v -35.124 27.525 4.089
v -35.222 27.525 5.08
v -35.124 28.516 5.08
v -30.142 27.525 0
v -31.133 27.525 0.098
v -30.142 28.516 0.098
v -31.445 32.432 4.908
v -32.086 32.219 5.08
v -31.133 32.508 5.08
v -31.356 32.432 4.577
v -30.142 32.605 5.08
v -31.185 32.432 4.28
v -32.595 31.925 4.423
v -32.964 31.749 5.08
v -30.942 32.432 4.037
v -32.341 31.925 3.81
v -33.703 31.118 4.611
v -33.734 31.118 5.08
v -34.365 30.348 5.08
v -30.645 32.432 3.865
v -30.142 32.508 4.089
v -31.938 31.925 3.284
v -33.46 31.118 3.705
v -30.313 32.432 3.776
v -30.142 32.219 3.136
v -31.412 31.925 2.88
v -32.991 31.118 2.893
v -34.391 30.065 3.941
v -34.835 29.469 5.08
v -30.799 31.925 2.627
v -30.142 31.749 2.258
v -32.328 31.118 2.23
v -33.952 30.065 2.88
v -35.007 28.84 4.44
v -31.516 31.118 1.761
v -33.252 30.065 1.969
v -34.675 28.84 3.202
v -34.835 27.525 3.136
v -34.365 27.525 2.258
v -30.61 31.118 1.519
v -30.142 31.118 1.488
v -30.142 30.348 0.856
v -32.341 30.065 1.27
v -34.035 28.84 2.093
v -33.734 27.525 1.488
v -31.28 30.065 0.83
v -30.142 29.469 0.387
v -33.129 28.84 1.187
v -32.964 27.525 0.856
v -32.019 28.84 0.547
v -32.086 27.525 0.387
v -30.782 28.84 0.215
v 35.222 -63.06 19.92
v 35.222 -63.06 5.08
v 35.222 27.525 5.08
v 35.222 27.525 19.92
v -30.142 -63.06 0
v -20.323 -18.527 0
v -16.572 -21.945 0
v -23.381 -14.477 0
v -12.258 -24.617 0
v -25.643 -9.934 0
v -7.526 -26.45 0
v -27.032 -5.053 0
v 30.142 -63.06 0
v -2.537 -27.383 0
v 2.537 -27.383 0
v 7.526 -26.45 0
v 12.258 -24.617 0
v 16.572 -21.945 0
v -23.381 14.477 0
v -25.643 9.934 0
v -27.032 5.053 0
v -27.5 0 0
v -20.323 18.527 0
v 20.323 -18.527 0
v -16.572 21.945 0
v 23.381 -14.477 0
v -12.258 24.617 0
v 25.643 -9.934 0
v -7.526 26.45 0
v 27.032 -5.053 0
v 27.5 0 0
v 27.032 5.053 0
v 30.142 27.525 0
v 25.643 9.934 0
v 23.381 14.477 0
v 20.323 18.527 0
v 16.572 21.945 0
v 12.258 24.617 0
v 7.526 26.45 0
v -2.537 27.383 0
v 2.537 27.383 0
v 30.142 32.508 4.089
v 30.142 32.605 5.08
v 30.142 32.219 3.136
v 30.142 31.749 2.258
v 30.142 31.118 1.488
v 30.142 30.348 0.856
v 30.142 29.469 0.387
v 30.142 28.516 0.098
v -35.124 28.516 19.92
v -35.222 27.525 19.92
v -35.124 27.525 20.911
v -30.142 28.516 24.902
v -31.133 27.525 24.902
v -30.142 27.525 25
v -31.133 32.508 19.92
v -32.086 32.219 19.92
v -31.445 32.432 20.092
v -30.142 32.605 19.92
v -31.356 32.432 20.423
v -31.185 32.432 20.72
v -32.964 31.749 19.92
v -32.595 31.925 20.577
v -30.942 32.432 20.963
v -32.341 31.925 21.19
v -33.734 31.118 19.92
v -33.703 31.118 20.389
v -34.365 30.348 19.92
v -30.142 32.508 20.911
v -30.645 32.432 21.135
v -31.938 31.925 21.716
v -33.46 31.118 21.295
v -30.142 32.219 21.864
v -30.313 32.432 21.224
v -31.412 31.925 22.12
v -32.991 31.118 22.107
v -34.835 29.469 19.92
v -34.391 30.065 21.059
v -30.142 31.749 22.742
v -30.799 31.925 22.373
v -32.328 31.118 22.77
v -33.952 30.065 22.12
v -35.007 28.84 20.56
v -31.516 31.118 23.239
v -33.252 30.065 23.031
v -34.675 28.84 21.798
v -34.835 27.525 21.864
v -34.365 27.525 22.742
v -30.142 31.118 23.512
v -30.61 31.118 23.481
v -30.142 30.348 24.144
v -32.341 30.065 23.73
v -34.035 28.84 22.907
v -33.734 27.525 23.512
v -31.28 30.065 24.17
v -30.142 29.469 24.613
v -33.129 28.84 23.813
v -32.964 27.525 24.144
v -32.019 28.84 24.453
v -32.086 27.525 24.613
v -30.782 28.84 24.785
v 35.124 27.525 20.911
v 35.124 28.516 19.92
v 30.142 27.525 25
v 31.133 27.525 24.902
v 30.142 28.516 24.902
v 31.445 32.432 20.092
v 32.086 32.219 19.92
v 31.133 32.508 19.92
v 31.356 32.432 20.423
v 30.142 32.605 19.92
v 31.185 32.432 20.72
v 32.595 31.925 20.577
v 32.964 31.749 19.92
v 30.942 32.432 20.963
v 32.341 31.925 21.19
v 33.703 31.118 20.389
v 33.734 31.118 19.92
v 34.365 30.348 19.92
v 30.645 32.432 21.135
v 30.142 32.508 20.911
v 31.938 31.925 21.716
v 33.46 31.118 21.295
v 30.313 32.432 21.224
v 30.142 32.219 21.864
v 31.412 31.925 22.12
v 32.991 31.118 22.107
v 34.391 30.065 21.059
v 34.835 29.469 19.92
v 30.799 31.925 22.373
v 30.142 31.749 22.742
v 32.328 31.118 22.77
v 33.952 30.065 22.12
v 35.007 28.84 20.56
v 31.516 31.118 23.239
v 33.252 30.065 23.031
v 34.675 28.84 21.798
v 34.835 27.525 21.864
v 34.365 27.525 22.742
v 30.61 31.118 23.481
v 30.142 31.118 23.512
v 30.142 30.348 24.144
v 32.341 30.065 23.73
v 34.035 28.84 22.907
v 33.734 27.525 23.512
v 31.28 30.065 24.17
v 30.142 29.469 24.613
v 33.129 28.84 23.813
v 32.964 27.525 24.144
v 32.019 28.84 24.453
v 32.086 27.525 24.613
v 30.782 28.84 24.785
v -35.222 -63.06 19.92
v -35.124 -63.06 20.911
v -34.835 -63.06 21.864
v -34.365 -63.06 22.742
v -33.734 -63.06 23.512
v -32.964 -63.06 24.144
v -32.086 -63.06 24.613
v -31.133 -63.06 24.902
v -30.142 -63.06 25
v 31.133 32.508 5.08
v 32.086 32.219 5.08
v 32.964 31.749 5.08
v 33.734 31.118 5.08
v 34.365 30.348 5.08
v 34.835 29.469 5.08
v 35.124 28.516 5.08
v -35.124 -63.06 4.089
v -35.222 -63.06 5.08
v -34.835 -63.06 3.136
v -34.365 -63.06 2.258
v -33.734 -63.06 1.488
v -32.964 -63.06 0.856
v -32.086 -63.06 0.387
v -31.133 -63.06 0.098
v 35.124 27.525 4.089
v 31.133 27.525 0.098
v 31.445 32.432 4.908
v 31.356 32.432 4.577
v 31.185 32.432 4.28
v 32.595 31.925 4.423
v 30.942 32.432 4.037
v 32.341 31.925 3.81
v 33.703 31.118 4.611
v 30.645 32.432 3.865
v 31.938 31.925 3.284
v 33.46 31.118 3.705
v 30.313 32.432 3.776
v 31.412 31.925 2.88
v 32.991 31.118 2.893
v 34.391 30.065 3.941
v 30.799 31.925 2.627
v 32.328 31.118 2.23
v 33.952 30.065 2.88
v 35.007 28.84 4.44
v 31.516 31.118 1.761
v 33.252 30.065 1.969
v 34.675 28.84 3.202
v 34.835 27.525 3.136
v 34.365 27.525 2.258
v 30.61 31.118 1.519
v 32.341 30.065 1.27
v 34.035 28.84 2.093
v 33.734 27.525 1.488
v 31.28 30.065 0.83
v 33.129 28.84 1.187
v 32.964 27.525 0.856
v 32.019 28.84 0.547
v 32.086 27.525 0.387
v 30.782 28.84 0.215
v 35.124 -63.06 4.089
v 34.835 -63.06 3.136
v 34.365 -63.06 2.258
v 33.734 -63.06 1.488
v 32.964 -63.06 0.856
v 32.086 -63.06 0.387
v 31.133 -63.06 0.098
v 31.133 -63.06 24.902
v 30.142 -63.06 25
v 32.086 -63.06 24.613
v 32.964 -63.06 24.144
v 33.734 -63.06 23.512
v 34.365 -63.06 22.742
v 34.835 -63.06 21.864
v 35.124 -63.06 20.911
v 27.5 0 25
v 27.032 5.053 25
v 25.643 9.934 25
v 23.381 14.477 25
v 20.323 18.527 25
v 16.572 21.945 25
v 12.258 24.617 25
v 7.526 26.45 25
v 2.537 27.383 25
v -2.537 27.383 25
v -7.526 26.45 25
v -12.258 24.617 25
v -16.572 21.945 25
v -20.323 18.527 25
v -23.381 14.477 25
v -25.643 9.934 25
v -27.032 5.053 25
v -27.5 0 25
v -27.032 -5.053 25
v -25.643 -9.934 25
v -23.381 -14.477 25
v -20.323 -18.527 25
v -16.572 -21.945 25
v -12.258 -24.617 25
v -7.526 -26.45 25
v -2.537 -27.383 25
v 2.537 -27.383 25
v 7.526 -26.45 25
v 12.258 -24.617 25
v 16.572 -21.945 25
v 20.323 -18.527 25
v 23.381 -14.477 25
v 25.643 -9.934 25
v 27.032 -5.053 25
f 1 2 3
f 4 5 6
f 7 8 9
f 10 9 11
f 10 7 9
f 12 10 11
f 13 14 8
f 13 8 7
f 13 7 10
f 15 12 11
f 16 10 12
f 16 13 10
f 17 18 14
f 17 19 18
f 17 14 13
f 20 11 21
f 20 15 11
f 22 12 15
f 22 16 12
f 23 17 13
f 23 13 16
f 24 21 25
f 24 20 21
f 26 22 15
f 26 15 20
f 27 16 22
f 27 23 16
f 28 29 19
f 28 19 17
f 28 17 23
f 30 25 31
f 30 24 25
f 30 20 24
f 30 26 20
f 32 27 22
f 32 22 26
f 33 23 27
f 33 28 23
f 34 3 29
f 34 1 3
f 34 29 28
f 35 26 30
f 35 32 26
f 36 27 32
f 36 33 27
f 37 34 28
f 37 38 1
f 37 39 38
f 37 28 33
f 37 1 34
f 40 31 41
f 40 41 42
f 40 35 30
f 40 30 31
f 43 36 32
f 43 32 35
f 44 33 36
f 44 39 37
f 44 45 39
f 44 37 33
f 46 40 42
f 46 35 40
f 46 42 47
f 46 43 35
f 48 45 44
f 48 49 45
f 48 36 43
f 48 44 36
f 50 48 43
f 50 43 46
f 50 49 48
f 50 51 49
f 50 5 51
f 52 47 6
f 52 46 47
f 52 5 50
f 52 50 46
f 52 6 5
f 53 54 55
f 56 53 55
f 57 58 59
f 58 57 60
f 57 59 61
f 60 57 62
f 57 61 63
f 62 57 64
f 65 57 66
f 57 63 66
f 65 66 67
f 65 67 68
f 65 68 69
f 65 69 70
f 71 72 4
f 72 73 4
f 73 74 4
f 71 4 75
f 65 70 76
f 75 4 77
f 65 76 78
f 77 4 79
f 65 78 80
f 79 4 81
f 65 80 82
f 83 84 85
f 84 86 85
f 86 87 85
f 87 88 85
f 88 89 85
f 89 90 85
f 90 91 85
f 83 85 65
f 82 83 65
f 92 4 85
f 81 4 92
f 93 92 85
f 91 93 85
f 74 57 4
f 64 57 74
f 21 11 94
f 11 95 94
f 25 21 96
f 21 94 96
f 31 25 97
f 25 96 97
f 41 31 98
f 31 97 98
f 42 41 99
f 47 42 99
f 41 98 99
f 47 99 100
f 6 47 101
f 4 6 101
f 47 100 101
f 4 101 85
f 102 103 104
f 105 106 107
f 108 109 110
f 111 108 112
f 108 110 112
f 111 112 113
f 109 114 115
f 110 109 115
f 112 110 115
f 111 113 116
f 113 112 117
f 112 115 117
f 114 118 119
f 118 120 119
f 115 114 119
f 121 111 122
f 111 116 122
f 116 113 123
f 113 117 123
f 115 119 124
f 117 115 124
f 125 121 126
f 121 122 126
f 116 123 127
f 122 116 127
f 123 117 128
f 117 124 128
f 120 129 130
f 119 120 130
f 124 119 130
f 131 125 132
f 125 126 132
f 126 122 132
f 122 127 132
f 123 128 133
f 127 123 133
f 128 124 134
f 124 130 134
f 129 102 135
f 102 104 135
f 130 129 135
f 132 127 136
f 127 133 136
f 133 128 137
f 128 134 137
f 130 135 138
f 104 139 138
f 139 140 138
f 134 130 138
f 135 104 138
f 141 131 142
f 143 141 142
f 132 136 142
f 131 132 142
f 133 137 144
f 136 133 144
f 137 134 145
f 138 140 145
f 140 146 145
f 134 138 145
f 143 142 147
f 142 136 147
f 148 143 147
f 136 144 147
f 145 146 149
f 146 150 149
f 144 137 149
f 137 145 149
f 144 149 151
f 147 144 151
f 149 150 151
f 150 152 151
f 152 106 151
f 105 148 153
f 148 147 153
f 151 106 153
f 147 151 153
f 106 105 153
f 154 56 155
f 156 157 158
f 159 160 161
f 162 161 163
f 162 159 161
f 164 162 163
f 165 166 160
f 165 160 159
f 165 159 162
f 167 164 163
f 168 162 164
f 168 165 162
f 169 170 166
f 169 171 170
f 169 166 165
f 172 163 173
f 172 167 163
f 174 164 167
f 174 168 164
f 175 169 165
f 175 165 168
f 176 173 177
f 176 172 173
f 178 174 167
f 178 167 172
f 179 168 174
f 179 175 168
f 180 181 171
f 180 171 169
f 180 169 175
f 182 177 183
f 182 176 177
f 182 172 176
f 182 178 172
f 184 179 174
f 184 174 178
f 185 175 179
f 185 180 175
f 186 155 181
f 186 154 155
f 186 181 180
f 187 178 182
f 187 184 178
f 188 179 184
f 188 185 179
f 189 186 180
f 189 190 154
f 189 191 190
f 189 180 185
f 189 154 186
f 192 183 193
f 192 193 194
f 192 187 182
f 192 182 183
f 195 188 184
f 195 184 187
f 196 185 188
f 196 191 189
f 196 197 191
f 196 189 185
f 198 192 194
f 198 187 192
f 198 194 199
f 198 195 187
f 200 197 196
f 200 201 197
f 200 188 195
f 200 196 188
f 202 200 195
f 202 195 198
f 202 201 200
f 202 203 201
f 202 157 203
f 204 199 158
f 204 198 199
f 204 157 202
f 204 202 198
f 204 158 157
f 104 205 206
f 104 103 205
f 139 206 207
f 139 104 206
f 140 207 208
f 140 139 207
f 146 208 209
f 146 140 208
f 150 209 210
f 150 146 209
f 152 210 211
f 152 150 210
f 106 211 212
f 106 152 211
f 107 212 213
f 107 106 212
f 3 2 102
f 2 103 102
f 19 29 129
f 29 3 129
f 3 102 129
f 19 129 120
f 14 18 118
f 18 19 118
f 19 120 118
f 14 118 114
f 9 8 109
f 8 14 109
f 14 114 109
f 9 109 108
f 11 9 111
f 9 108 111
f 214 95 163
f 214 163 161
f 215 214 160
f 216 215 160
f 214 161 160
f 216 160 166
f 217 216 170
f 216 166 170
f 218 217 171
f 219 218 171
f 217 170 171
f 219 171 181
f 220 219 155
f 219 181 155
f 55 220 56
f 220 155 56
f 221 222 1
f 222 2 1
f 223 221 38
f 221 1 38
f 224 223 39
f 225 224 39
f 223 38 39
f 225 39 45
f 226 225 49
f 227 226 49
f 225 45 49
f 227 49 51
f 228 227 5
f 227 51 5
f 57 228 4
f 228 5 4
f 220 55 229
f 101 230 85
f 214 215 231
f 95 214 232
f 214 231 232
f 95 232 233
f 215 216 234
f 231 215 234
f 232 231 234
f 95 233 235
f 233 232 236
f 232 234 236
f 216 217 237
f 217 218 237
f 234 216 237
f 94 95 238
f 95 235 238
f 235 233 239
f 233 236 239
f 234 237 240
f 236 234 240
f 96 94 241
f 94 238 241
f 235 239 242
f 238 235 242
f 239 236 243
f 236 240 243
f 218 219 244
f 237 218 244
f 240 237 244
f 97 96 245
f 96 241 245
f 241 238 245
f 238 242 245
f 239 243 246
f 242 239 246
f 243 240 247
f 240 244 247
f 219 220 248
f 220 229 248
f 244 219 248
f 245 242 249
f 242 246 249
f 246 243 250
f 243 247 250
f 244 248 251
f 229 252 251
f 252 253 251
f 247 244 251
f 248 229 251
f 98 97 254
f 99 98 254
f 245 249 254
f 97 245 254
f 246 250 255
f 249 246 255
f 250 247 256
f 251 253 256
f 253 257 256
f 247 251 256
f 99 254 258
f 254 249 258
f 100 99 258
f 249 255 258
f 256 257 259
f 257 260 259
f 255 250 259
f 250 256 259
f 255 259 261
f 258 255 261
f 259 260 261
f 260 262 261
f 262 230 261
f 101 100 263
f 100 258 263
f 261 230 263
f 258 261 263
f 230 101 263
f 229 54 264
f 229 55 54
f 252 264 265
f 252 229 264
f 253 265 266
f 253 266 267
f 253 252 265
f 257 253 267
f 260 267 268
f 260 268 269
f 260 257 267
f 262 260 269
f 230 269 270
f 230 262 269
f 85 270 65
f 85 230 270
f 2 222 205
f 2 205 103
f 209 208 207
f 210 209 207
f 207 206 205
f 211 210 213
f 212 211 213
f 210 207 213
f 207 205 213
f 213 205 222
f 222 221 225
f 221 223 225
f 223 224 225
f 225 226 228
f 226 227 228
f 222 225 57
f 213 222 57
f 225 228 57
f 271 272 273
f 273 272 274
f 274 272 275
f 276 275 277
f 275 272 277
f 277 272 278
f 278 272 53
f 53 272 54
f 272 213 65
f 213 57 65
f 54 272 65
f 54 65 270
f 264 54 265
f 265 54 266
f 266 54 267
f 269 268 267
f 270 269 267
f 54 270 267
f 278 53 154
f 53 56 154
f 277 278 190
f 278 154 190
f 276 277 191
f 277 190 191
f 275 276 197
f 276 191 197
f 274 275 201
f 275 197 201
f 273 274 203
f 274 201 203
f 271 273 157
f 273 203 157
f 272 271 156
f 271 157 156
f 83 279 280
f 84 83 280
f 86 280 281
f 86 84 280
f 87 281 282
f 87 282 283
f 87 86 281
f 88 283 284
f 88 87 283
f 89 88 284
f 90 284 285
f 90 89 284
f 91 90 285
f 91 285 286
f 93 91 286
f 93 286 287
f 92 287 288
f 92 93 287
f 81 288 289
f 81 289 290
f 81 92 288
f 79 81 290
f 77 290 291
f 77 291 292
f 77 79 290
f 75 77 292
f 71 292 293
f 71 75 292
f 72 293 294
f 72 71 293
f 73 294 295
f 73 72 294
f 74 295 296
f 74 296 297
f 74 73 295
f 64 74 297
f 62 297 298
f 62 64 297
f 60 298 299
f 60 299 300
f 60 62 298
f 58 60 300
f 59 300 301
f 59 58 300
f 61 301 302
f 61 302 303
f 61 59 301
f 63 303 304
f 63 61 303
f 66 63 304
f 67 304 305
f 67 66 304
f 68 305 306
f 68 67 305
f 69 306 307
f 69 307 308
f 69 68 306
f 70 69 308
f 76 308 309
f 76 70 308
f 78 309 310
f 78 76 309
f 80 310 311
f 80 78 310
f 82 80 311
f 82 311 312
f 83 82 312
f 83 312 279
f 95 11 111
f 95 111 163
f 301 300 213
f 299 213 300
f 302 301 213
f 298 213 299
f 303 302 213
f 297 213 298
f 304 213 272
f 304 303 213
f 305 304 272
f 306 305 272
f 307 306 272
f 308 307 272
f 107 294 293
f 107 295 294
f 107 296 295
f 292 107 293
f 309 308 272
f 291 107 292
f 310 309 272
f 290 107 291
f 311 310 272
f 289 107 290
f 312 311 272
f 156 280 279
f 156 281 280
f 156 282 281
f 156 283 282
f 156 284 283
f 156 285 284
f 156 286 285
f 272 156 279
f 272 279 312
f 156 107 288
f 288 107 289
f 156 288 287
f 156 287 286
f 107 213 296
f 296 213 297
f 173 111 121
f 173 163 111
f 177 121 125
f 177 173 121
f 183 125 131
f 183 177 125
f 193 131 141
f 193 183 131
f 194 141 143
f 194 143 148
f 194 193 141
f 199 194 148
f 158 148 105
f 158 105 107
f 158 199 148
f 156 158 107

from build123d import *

# Parameters (mm, degrees)
F0_W     = 70.4432
F0_H     = 95.6654
F0_R     = 27.5
F1_DEPTH = 25
F2_R     = 5.08


with BuildPart() as f1:
    # F0 (on Top) → F1 (new body)
    with BuildSketch(Plane.XY):
        with Locations((0, -15.2273)):
            Rectangle(F0_W, F0_H)
        Circle(F0_R, mode=Mode.SUBTRACT)
    extrude(amount=F1_DEPTH)

    # F2
    f2_edges = [f1.edges().sort_by_distance(p)[0] for p in [
        (35.2216, -15.2273, 25),
        (35.2216, -15.2273, 0),
        (-35.2216, -15.2273, 25),
        (-35.2216, -15.2273, 0),
        (-35.2216, 32.6054, 12.5),
        (35.2216, 32.6054, 12.5),
        (0, 32.6054, 25),
        (0, 32.6054, 0),
    ]]
    fillet(f2_edges, radius=F2_R)


solid = f1.part
